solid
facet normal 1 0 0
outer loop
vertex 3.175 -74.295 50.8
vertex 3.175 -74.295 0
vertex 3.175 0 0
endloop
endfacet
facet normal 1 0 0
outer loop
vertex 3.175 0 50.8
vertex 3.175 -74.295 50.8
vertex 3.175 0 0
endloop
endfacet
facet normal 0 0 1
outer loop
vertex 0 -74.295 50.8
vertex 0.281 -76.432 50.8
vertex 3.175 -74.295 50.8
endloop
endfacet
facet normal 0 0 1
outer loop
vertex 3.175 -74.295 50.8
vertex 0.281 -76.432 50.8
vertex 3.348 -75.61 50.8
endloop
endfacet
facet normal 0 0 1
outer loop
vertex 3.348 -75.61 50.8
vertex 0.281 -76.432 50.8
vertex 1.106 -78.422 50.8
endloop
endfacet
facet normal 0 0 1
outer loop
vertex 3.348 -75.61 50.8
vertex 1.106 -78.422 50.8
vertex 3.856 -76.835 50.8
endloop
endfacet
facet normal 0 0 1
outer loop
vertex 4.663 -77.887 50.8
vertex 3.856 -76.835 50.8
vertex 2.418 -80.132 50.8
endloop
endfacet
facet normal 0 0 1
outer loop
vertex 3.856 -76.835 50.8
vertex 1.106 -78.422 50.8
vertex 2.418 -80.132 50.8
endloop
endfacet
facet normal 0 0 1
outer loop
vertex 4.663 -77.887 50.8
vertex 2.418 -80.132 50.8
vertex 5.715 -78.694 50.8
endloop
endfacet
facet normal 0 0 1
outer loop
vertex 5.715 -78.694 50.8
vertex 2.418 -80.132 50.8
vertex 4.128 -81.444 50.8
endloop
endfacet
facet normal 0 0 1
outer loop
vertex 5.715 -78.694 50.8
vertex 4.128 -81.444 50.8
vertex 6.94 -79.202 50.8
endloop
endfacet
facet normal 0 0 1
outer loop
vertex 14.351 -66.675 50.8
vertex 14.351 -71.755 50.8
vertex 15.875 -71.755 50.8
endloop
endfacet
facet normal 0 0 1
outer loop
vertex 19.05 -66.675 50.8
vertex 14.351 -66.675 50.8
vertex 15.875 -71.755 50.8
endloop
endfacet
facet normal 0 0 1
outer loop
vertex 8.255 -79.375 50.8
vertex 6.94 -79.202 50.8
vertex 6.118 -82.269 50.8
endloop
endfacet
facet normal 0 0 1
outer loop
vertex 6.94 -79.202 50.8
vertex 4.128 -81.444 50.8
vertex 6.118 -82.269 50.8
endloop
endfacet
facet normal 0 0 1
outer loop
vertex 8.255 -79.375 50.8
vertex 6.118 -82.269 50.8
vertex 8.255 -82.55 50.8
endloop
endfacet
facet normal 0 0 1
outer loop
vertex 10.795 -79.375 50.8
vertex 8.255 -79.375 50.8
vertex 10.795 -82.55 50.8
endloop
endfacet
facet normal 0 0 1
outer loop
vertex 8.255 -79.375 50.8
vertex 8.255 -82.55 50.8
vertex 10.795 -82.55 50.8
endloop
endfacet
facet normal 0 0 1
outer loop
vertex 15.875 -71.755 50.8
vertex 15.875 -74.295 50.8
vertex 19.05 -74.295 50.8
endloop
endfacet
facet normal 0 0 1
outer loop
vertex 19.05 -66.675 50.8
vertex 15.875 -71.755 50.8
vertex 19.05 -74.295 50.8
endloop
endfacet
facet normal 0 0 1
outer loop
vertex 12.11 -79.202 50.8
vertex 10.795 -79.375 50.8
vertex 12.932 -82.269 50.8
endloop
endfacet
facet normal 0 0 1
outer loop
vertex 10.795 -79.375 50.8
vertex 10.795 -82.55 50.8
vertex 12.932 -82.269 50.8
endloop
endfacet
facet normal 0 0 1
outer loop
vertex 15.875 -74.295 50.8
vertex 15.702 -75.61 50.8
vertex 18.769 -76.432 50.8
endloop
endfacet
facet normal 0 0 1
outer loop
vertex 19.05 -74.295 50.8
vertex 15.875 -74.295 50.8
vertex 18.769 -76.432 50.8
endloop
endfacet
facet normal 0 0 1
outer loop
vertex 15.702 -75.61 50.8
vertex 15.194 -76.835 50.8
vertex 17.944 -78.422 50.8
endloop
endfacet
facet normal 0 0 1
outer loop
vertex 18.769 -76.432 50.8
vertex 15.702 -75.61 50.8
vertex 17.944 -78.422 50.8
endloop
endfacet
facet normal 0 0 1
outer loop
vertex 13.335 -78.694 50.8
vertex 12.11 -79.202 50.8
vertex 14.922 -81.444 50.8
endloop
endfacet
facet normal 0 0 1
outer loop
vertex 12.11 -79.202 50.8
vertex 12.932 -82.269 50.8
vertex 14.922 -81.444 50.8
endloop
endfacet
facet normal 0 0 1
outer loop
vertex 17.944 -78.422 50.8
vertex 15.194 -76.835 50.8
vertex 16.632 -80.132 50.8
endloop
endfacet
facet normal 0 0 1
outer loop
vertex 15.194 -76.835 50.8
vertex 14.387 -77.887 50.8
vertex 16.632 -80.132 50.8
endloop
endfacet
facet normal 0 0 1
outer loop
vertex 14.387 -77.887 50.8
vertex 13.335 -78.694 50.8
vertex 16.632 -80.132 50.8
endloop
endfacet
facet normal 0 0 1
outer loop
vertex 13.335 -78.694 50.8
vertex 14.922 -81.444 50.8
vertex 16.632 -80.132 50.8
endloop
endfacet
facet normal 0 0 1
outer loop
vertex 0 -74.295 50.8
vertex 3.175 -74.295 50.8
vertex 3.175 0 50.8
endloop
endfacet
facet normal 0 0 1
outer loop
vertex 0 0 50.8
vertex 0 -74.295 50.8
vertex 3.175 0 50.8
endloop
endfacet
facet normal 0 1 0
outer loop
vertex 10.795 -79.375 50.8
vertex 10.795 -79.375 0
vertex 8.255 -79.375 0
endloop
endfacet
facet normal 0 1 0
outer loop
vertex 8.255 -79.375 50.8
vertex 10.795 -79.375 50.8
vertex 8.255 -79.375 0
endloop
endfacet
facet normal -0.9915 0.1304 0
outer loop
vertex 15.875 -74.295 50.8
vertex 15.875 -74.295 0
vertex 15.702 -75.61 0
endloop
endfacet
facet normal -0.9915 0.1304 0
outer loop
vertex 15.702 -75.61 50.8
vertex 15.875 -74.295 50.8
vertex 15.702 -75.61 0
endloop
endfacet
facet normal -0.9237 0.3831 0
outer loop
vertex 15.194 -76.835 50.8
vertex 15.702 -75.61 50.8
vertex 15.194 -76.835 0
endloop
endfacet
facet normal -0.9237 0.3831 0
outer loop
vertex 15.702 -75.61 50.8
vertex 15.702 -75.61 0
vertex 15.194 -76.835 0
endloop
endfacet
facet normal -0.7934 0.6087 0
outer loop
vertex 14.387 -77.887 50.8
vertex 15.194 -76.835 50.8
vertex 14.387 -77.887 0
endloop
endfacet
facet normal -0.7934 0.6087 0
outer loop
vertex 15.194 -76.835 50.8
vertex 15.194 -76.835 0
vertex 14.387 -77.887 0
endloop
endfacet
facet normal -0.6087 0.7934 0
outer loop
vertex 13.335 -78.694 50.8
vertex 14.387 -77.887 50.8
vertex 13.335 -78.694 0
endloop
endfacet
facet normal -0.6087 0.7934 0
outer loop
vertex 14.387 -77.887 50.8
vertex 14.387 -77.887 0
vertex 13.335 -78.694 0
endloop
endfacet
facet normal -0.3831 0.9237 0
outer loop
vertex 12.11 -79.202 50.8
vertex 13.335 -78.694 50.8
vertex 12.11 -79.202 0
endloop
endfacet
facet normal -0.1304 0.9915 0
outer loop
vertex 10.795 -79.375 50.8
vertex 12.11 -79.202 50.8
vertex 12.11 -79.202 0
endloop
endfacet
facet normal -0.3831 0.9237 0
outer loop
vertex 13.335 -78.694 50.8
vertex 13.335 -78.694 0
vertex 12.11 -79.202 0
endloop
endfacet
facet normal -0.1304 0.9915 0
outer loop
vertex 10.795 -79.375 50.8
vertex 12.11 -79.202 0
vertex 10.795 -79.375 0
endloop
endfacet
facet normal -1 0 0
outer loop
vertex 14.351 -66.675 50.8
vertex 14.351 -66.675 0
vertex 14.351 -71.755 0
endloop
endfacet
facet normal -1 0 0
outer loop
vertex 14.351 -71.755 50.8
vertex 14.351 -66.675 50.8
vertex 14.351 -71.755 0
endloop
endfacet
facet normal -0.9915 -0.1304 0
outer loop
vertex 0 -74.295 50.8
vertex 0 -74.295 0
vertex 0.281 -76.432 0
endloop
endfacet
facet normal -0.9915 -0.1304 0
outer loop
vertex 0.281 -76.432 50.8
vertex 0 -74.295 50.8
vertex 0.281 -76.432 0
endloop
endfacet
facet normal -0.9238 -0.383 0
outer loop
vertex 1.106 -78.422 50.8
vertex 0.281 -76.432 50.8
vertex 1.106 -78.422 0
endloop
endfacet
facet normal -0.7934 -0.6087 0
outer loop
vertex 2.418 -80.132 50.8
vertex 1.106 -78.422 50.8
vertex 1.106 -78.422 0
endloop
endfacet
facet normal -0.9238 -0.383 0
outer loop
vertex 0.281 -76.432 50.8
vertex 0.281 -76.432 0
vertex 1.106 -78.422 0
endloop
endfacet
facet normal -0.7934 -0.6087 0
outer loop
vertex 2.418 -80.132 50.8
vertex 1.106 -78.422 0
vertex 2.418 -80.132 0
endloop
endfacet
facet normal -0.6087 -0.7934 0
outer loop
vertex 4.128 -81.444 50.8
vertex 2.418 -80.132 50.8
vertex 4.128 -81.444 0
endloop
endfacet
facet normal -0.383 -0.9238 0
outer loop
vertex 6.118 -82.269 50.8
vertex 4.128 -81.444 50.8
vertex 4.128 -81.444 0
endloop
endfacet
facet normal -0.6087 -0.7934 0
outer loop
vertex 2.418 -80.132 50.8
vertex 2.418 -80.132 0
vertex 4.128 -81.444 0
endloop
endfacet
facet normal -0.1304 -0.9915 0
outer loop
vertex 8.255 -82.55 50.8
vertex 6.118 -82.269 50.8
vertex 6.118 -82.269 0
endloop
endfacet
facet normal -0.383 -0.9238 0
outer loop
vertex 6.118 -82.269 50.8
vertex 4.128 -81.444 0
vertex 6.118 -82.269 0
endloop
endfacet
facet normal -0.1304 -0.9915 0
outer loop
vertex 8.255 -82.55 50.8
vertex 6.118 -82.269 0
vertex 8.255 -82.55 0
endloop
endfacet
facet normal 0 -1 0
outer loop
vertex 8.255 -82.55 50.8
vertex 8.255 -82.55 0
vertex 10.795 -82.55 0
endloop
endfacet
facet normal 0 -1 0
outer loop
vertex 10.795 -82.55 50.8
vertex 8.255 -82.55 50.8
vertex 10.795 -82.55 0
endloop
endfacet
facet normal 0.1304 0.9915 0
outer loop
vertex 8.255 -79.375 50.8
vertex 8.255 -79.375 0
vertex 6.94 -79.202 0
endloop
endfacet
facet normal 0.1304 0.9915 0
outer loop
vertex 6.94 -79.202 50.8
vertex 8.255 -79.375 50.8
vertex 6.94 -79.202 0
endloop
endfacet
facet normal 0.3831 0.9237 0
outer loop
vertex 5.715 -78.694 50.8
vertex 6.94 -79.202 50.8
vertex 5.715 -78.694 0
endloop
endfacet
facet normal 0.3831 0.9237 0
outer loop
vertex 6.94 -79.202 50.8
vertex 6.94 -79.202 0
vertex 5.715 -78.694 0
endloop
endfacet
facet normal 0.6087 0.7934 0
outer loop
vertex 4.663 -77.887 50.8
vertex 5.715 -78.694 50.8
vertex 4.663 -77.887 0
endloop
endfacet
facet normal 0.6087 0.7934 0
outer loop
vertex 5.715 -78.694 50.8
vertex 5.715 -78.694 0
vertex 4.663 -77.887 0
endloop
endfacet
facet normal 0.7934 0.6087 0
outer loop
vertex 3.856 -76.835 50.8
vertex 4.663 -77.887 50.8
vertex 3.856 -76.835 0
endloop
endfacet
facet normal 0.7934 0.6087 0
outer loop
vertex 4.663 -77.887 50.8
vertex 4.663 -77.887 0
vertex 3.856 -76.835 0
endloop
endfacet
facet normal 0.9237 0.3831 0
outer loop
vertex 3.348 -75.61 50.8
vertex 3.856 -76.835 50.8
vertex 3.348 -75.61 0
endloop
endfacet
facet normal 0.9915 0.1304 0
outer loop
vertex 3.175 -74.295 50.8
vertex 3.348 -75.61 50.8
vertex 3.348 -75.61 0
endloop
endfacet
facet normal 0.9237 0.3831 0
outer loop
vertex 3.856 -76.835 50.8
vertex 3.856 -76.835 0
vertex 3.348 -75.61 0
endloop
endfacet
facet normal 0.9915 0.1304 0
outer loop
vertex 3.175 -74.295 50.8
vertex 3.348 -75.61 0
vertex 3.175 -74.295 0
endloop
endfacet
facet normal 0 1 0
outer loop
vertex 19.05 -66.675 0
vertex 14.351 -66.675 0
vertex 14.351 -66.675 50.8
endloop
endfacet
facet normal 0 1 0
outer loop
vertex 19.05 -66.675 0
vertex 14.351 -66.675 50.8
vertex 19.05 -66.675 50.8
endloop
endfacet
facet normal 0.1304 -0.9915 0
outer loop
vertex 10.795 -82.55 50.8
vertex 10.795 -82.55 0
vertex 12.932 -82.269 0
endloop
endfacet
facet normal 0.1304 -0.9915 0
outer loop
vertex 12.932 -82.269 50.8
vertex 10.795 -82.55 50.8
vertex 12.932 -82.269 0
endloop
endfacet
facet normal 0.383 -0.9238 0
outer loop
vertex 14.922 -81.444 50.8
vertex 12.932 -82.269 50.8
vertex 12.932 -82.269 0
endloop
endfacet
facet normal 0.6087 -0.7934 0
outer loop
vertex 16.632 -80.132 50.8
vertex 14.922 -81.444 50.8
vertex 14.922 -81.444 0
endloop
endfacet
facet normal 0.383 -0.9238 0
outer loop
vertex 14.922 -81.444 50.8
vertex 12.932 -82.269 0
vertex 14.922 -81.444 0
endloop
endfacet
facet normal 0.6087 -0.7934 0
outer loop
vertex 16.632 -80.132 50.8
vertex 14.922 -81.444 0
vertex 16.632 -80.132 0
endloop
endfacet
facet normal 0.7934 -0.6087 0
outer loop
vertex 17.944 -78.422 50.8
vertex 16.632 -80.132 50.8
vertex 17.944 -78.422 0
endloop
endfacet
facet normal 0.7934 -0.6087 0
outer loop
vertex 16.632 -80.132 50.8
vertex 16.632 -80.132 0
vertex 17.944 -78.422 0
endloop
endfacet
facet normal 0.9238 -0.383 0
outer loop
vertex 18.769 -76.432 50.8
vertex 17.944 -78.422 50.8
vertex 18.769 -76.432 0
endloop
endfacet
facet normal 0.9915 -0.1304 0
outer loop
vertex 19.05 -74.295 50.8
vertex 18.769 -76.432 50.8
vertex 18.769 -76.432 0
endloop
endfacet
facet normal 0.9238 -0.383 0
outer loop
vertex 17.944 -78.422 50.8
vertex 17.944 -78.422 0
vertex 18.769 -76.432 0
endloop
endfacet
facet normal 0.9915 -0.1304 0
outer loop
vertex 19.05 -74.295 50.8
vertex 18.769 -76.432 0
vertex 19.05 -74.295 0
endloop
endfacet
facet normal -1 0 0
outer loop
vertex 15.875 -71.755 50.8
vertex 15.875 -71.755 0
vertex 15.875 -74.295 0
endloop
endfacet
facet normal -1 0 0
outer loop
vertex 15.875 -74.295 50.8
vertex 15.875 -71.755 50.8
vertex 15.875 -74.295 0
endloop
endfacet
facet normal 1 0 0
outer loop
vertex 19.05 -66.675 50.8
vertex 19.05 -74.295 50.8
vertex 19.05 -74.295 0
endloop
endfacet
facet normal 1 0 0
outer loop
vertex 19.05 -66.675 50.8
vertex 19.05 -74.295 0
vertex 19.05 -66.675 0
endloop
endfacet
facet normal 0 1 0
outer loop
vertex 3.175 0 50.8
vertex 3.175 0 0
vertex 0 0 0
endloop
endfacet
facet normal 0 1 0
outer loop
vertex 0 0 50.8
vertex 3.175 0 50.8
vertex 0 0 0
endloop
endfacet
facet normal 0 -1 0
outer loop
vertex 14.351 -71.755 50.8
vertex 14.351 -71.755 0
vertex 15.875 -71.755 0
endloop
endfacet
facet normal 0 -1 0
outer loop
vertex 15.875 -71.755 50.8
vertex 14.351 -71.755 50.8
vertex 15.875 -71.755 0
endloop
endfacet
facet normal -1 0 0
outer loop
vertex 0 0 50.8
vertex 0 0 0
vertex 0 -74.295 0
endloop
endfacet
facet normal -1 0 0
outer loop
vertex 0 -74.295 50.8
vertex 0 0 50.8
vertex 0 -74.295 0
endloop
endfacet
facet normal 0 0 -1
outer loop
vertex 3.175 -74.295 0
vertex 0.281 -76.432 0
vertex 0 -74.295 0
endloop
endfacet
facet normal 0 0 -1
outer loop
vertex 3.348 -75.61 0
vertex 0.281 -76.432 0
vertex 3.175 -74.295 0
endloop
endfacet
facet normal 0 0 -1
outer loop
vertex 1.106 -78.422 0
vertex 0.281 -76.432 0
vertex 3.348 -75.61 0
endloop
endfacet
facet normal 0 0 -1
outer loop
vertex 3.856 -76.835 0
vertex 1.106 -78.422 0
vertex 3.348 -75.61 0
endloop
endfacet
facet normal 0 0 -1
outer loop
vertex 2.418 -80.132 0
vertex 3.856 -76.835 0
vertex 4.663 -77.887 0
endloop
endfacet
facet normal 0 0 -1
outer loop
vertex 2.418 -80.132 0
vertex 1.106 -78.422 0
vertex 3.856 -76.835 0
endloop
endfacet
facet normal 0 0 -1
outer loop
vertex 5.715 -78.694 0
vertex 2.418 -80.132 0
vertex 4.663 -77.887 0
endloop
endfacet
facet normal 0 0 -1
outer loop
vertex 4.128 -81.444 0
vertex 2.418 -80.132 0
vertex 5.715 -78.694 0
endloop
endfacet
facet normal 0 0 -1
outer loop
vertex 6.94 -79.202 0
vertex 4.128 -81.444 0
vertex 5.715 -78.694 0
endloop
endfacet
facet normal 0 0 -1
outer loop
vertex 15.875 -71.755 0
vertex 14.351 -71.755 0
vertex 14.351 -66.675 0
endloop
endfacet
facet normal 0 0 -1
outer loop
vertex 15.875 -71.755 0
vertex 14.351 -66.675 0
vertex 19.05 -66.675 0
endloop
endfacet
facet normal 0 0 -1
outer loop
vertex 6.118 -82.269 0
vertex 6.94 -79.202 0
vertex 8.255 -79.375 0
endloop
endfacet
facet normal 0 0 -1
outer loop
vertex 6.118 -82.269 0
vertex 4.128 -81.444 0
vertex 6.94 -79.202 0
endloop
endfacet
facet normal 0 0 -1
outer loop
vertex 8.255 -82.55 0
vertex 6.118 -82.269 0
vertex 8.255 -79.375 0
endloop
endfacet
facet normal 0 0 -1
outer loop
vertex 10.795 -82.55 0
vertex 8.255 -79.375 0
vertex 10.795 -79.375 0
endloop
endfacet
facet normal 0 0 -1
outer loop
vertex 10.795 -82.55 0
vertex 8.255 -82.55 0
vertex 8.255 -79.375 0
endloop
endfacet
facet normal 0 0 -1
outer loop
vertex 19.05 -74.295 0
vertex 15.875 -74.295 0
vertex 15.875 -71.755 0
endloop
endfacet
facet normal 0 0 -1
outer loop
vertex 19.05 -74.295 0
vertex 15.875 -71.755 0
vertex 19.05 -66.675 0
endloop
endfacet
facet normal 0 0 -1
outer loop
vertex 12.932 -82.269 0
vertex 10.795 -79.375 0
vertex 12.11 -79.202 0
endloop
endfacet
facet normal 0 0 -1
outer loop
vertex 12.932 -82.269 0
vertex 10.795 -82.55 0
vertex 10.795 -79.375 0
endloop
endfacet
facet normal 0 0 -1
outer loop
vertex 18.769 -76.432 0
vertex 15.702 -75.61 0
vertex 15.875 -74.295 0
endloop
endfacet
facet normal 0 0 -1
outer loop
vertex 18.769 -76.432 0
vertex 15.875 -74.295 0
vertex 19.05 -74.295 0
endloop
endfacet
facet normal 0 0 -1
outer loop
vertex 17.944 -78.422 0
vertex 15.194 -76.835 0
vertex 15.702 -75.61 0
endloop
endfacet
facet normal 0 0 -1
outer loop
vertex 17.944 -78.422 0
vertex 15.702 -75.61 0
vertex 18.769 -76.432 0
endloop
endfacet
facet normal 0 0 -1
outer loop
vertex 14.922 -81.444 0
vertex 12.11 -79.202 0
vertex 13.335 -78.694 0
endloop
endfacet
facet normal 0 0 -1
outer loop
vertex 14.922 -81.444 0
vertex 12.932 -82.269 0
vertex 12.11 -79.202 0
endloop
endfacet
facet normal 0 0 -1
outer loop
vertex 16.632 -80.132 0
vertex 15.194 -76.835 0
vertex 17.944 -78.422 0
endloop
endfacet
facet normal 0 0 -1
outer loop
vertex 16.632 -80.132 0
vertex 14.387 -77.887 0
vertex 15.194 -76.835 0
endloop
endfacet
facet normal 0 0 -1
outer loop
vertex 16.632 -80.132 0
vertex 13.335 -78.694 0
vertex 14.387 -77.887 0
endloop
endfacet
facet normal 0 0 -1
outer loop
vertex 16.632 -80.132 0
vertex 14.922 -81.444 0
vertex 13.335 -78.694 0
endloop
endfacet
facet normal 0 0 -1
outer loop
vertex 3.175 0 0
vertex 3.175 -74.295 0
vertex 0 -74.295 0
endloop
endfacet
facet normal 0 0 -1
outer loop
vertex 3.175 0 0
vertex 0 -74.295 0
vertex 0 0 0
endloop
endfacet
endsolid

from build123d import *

# Parameters (mm, degrees)
F1_DEPTH = 50.8
F2_W     = 1.524
F2_H     = 5.08
F3_DEPTH = 50.8


with BuildPart() as f1:
    # F0 (on Top) → F1 (new body)
    with BuildSketch(Plane.XY):
        with BuildLine():
            Line((3.175, 0), (0, 0))
            Line((0, 0), (0, -74.295))
            ThreePointArc((0, -74.295), (2.417834, -80.132166), (8.255, -82.55))
            Line((8.255, -82.55), (10.795, -82.55))
            ThreePointArc((10.795, -82.55), (16.632166, -80.132166), (19.05, -74.295))
            Line((19.05, -74.295), (19.05, -66.675))
            Line((19.05, -66.675), (15.875, -66.675))
            Line((15.875, -66.675), (15.875, -74.295))
            ThreePointArc((15.875, -74.295), (14.387102, -77.887102), (10.795, -79.375))
            Line((10.795, -79.375), (8.255, -79.375))
            ThreePointArc((8.255, -79.375), (4.662898, -77.887102), (3.175, -74.295))
            Line((3.175, -74.295), (3.175, 0))
        make_face()
    extrude(amount=F1_DEPTH)

    # F2 (on face) → F3 (join)
    with BuildSketch(Plane(origin=(0, 0, 0), x_dir=(1, 0, 0), z_dir=(0, 0, -1))):
        with Locations((15.113, 69.215)):
            Rectangle(F2_W, F2_H)
    extrude(amount=-F3_DEPTH)


solid = f1.part
